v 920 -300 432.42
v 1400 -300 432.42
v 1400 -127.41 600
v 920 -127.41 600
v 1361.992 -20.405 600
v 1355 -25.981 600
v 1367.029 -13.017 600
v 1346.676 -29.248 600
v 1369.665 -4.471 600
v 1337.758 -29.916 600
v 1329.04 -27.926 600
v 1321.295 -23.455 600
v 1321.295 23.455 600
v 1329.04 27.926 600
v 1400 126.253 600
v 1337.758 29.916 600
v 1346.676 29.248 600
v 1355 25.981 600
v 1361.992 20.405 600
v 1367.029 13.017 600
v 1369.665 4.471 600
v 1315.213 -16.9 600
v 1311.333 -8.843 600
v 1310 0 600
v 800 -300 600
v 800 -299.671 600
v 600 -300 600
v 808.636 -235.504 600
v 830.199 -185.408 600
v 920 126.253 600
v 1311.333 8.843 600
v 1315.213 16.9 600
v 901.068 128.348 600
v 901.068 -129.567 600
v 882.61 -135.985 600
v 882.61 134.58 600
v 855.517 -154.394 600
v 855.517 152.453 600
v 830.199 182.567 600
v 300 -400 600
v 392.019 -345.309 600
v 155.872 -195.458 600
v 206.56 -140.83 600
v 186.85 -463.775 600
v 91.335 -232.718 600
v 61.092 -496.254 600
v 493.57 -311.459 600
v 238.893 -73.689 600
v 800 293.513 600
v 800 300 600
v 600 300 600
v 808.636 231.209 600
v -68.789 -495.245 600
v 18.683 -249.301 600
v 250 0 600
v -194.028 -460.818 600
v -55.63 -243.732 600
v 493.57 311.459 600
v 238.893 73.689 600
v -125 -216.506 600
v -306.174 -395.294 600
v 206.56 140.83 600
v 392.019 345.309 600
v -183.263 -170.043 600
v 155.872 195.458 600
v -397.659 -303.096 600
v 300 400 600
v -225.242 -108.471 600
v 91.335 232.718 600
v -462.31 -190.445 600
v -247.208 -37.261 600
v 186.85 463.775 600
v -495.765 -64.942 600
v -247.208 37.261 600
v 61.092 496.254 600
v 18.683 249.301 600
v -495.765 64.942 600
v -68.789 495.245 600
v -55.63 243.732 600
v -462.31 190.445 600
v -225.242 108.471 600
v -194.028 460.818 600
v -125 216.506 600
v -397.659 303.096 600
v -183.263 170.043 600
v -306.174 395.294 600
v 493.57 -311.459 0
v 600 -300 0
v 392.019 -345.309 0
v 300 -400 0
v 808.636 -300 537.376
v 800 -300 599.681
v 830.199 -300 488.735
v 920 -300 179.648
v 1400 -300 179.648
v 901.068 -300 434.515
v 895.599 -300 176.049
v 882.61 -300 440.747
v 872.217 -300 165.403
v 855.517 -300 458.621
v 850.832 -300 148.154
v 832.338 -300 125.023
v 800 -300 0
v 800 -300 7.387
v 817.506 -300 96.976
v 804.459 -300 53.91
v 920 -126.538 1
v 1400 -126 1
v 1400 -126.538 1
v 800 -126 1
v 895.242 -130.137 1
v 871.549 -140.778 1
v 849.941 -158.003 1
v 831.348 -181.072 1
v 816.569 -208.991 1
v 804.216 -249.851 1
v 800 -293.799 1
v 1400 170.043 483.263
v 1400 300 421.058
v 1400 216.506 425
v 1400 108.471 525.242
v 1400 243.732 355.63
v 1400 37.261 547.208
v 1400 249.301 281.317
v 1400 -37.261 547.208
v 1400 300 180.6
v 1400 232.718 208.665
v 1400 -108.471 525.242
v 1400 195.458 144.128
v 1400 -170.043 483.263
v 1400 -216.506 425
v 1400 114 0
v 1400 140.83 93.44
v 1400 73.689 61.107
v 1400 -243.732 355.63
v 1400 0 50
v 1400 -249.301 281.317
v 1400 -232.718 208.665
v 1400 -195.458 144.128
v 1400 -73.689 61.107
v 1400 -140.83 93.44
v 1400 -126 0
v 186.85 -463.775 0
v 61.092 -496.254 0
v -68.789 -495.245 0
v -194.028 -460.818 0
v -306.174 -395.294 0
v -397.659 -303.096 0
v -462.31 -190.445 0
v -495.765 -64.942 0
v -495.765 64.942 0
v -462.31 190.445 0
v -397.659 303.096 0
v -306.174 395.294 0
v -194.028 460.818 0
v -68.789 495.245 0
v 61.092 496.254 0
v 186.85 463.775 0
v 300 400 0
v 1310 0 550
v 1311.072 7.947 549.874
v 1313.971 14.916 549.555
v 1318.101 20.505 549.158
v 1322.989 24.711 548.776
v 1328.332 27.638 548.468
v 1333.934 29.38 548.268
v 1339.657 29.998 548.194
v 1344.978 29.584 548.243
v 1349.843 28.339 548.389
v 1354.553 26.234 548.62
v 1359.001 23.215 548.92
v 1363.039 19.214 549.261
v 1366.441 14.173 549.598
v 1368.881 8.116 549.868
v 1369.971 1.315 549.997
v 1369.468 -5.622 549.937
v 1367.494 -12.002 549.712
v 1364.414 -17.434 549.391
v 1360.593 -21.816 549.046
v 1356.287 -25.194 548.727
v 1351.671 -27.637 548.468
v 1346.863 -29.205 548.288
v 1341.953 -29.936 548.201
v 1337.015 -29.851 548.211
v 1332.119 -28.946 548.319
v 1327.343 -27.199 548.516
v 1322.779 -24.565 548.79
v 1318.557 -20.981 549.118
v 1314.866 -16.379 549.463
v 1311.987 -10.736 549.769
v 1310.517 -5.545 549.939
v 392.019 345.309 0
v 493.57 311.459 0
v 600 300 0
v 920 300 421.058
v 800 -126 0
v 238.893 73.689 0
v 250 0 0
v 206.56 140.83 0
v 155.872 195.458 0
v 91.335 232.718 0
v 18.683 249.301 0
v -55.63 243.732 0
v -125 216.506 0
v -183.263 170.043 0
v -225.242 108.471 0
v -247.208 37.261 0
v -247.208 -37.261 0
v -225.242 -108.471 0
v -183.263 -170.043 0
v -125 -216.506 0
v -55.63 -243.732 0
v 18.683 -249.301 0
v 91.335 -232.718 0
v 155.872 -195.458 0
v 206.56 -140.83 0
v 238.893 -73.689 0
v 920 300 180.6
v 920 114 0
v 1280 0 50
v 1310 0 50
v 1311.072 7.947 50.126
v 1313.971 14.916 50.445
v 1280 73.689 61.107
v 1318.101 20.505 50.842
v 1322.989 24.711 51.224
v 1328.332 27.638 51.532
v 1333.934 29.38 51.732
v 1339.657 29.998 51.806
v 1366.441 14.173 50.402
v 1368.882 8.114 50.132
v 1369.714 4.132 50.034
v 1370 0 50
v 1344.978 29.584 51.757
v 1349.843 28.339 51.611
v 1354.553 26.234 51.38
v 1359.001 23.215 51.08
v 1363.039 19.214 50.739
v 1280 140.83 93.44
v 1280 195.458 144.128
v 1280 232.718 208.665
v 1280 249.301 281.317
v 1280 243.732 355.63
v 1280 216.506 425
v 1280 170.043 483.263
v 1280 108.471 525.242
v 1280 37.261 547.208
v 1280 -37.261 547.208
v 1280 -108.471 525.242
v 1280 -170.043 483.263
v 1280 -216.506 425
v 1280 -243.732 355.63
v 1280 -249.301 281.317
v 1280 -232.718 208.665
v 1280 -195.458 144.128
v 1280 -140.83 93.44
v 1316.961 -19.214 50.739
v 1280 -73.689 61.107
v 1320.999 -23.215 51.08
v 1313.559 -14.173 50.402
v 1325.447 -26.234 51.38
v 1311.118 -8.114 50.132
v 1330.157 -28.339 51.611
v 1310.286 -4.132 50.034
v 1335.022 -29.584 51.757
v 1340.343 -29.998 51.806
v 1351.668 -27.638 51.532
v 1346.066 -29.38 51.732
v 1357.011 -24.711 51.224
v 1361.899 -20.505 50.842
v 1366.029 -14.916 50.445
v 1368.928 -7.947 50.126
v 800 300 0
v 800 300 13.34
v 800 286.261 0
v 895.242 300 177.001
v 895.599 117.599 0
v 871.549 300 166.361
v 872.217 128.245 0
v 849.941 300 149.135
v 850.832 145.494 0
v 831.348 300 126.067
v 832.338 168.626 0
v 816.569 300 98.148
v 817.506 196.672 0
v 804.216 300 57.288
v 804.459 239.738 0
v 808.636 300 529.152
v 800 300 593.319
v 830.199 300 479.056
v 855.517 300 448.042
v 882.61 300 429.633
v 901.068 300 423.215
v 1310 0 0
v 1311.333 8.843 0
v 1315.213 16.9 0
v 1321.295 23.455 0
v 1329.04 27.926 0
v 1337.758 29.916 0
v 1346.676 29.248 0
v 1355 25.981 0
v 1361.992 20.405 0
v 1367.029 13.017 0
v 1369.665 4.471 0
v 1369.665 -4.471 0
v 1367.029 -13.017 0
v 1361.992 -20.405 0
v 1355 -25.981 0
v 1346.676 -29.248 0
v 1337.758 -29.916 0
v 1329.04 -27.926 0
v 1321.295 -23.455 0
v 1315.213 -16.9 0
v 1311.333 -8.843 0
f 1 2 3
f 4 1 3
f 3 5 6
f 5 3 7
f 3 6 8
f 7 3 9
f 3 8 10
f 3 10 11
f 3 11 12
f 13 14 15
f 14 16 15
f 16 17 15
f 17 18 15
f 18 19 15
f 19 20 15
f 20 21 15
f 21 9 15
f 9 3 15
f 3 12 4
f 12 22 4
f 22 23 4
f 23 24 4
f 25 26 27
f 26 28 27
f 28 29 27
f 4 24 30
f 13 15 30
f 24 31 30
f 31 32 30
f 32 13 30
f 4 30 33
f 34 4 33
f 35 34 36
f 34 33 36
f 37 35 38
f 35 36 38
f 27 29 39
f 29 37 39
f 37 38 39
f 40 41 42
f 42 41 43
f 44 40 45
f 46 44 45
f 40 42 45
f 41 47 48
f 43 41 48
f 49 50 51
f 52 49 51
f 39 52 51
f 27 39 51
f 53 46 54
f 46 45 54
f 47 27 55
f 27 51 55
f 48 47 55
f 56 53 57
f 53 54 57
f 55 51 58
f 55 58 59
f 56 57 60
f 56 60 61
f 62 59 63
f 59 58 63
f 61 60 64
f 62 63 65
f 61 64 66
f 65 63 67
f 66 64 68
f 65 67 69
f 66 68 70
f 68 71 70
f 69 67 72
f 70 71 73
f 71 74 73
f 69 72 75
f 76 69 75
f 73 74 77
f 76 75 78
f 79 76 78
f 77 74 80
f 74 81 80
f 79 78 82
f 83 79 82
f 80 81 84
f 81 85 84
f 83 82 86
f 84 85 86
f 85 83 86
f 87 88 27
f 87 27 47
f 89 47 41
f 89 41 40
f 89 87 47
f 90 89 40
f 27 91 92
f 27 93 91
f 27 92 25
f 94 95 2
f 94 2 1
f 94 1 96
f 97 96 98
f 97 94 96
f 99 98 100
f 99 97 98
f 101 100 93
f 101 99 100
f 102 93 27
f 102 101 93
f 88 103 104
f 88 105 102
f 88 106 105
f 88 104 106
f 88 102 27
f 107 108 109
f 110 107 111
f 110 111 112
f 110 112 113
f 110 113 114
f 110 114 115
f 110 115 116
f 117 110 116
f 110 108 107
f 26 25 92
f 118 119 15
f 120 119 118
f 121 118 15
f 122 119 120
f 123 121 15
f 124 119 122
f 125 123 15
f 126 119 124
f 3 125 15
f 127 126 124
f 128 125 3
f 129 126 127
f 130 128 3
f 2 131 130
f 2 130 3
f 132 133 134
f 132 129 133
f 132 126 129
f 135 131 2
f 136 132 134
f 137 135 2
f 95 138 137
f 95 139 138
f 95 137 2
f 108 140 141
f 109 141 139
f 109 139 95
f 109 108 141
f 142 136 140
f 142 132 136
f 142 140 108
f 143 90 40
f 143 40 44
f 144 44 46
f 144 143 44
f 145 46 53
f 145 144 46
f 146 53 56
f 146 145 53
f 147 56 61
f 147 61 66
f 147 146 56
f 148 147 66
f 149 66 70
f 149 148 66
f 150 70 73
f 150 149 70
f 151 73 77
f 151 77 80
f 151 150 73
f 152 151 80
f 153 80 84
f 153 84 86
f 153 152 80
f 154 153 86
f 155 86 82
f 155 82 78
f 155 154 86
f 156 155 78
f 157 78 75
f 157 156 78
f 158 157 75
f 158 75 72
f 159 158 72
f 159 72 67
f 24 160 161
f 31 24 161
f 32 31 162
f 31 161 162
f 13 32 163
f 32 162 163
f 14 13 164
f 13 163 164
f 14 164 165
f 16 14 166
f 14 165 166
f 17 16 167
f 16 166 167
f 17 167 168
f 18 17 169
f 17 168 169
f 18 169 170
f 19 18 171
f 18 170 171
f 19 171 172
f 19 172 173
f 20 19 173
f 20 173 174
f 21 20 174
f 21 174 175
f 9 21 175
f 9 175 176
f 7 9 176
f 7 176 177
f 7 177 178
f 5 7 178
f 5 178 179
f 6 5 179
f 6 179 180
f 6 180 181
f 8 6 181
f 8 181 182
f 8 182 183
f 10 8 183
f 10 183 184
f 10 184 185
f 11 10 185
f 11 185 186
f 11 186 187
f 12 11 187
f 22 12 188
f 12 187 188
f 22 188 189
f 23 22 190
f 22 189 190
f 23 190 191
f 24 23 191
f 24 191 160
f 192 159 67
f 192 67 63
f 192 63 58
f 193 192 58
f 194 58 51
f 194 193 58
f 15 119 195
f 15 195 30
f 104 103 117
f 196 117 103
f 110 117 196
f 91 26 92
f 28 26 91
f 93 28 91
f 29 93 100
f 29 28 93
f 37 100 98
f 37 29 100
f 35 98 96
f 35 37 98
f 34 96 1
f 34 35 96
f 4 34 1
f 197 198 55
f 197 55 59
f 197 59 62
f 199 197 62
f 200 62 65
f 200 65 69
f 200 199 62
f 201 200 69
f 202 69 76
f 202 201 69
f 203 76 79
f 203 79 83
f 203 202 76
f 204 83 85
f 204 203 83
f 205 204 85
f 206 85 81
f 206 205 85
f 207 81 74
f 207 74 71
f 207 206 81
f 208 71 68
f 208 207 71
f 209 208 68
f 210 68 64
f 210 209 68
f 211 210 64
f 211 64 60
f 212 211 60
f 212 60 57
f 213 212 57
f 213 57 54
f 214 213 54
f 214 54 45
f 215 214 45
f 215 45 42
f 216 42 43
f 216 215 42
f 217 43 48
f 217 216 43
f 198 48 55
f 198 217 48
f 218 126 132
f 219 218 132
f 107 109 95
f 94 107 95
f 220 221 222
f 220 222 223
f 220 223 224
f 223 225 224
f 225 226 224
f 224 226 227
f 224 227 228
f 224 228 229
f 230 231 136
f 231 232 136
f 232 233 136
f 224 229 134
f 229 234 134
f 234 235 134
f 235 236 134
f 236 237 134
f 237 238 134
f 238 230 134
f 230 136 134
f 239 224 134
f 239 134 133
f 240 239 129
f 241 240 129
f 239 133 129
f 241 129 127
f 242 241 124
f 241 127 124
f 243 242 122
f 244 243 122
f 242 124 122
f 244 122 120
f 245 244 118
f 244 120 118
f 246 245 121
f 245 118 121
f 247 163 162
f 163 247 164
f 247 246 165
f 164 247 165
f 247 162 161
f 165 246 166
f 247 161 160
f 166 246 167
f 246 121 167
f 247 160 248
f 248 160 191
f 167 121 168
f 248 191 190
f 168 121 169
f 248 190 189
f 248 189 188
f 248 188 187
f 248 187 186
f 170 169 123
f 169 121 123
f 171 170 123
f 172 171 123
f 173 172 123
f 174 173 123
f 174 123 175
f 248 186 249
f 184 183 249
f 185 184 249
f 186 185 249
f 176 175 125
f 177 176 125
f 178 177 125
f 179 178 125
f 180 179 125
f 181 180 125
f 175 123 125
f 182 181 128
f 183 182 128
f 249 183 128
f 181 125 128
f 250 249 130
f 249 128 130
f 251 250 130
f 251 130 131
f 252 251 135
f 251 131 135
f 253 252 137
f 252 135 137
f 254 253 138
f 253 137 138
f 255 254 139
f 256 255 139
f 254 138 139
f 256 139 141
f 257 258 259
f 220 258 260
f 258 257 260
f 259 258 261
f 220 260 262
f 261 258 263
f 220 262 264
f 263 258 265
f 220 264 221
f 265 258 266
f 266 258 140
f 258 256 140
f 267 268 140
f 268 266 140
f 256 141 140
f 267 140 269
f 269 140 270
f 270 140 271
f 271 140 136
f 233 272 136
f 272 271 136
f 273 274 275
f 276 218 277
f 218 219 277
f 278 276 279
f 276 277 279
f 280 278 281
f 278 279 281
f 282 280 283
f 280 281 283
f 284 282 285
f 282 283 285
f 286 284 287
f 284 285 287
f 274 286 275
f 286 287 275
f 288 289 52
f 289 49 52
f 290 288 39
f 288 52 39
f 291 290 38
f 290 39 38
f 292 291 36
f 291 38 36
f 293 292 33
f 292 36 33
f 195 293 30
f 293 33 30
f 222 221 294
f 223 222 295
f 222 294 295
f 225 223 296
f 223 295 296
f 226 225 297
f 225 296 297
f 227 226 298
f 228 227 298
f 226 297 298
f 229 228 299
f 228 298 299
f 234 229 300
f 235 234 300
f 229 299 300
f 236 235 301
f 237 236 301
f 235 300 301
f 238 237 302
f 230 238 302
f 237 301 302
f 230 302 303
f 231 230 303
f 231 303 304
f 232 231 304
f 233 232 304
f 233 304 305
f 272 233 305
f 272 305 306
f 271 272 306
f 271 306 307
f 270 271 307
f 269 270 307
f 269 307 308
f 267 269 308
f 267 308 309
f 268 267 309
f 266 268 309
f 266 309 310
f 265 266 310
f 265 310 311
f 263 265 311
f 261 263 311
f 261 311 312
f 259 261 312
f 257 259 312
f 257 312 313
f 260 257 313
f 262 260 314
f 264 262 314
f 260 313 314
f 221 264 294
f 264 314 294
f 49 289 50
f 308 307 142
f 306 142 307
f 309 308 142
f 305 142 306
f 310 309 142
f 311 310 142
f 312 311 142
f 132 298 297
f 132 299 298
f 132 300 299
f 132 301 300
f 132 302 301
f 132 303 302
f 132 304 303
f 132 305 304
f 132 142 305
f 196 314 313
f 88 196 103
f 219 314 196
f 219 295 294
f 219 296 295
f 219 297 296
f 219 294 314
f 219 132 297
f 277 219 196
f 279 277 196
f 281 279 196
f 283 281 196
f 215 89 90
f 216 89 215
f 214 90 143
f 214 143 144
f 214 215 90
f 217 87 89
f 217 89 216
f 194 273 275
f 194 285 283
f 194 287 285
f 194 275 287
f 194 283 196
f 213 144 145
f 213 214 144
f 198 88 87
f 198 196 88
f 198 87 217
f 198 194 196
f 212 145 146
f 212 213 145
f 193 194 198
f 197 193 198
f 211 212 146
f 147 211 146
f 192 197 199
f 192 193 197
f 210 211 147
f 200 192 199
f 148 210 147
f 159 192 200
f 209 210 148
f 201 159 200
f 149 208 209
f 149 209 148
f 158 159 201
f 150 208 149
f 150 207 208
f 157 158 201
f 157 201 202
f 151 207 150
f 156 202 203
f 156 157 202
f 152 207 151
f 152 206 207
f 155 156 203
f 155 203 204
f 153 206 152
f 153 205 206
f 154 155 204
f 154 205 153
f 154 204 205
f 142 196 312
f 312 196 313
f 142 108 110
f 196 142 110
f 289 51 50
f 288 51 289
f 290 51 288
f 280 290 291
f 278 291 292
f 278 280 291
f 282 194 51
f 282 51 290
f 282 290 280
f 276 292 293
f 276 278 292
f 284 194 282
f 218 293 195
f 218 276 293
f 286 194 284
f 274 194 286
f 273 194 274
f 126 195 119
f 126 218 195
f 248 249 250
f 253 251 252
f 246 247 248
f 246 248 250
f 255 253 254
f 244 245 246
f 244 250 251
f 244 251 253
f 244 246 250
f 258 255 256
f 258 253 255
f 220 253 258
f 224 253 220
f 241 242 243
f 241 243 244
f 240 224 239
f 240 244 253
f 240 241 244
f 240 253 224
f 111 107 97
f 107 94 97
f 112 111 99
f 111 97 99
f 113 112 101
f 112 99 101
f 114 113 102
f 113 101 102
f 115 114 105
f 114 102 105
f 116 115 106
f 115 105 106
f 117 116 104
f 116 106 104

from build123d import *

# Parameters (mm, degrees)
SKETCH1_R              = 250
BOSS_EXTRUDE1_DEPTH    = 600
CUT_EXTRUDE6_DEPTH     = 600
CUT_EXTRUDE8_START     = -1
CUT_EXTRUDE8_OUTLINE_W = 600
CUT_EXTRUDE8_OUTLINE_H = 174.000412652
CUT_EXTRUDE8_DEPTH     = 1
FILLET2_R              = 120
SKETCH8_R              = 250
CUT_EXTRUDE10_DEPTH    = 120
SKETCH9_R              = 30
CUT_EXTRUDE11_DEPTH    = 1604.121954188


# Read off the part's stored shape, not the designer's step: Cut-Extrude8
with BuildPart() as part:
    # Sketch1 → Boss-Extrude1 (new body)
    with BuildSketch(Plane.XY):
        with BuildLine():
            Line((600, 300), (1400, 300))
            Line((1400, 300), (1400, -300))
            Line((1400, -300), (600, -300))
            ThreePointArc((600, -300), (441.886116992, -325.658350975), (300, -400))
            ThreePointArc((300, -400), (-500, 0), (300, 400))
            ThreePointArc((300, 400), (441.886116992, 325.658350975), (600, 300))
        make_face()
        Circle(SKETCH1_R, mode=Mode.SUBTRACT)
    extrude(amount=BOSS_EXTRUDE1_DEPTH)

    # Sketch2 → Cut-Extrude6 (cut)
    with BuildSketch(Plane(origin=(1400, 0, 0), x_dir=(0, 0, -1), z_dir=(1, 0, 0))):
        Polygon((-180.6, 300), (0, 114), (0, 300), align=None)
        Polygon((-600, -300), (-432.420494682, -300), (-600, -127.409811799), align=None)
        Polygon((-0.445053521, -300), (-0.445053521, -125.999587348), (-179.648136318, -300), align=None)
        Polygon((-606.599587348, 119.845053521), (-606.599587348, 300.445053521), (-420.599587348, 300.445053521), align=None)
    extrude(amount=-CUT_EXTRUDE6_DEPTH, mode=Mode.SUBTRACT)

    # Cut-Extrude8 outline → Cut-Extrude8 (cut)
    with BuildSketch(Plane(origin=(0, 0, 0), x_dir=(-1, 0, 0), z_dir=(0, 0, -1)).offset(CUT_EXTRUDE8_START)):
        with Locations((-1100, -212.999793674)):
            Rectangle(CUT_EXTRUDE8_OUTLINE_W, CUT_EXTRUDE8_OUTLINE_H)
    extrude(amount=CUT_EXTRUDE8_DEPTH, mode=Mode.SUBTRACT)

    # Fillet2
    fillet2_edges = [part.edges().sort_by_distance(p)[0] for p in [
        (800, 213.126519973, 510.528974059),
        (800, -213.269211239, 90.324068159),
        (800, -213.7049059, 516.210247341),
        (800, 207, 90.3),
    ]]
    fillet(fillet2_edges, radius=FILLET2_R)

    # Sketch8 → Cut-Extrude10 (cut)
    with BuildSketch(Plane(origin=(1400, 0, 0), x_dir=(0, 0, -1), z_dir=(1, 0, 0))):
        with Locations((-300, 0)):
            Circle(SKETCH8_R)
    extrude(amount=-CUT_EXTRUDE10_DEPTH, mode=Mode.SUBTRACT)

    # Sketch9 → Cut-Extrude11 (cut, through all)
    with BuildSketch(Plane(origin=(0, 0, 0), x_dir=(-1, 0, 0), z_dir=(0, 0, -1))):
        with Locations((-1340, 0)):
            Circle(SKETCH9_R)
    extrude(amount=-CUT_EXTRUDE11_DEPTH, mode=Mode.SUBTRACT)


solid = part.part
